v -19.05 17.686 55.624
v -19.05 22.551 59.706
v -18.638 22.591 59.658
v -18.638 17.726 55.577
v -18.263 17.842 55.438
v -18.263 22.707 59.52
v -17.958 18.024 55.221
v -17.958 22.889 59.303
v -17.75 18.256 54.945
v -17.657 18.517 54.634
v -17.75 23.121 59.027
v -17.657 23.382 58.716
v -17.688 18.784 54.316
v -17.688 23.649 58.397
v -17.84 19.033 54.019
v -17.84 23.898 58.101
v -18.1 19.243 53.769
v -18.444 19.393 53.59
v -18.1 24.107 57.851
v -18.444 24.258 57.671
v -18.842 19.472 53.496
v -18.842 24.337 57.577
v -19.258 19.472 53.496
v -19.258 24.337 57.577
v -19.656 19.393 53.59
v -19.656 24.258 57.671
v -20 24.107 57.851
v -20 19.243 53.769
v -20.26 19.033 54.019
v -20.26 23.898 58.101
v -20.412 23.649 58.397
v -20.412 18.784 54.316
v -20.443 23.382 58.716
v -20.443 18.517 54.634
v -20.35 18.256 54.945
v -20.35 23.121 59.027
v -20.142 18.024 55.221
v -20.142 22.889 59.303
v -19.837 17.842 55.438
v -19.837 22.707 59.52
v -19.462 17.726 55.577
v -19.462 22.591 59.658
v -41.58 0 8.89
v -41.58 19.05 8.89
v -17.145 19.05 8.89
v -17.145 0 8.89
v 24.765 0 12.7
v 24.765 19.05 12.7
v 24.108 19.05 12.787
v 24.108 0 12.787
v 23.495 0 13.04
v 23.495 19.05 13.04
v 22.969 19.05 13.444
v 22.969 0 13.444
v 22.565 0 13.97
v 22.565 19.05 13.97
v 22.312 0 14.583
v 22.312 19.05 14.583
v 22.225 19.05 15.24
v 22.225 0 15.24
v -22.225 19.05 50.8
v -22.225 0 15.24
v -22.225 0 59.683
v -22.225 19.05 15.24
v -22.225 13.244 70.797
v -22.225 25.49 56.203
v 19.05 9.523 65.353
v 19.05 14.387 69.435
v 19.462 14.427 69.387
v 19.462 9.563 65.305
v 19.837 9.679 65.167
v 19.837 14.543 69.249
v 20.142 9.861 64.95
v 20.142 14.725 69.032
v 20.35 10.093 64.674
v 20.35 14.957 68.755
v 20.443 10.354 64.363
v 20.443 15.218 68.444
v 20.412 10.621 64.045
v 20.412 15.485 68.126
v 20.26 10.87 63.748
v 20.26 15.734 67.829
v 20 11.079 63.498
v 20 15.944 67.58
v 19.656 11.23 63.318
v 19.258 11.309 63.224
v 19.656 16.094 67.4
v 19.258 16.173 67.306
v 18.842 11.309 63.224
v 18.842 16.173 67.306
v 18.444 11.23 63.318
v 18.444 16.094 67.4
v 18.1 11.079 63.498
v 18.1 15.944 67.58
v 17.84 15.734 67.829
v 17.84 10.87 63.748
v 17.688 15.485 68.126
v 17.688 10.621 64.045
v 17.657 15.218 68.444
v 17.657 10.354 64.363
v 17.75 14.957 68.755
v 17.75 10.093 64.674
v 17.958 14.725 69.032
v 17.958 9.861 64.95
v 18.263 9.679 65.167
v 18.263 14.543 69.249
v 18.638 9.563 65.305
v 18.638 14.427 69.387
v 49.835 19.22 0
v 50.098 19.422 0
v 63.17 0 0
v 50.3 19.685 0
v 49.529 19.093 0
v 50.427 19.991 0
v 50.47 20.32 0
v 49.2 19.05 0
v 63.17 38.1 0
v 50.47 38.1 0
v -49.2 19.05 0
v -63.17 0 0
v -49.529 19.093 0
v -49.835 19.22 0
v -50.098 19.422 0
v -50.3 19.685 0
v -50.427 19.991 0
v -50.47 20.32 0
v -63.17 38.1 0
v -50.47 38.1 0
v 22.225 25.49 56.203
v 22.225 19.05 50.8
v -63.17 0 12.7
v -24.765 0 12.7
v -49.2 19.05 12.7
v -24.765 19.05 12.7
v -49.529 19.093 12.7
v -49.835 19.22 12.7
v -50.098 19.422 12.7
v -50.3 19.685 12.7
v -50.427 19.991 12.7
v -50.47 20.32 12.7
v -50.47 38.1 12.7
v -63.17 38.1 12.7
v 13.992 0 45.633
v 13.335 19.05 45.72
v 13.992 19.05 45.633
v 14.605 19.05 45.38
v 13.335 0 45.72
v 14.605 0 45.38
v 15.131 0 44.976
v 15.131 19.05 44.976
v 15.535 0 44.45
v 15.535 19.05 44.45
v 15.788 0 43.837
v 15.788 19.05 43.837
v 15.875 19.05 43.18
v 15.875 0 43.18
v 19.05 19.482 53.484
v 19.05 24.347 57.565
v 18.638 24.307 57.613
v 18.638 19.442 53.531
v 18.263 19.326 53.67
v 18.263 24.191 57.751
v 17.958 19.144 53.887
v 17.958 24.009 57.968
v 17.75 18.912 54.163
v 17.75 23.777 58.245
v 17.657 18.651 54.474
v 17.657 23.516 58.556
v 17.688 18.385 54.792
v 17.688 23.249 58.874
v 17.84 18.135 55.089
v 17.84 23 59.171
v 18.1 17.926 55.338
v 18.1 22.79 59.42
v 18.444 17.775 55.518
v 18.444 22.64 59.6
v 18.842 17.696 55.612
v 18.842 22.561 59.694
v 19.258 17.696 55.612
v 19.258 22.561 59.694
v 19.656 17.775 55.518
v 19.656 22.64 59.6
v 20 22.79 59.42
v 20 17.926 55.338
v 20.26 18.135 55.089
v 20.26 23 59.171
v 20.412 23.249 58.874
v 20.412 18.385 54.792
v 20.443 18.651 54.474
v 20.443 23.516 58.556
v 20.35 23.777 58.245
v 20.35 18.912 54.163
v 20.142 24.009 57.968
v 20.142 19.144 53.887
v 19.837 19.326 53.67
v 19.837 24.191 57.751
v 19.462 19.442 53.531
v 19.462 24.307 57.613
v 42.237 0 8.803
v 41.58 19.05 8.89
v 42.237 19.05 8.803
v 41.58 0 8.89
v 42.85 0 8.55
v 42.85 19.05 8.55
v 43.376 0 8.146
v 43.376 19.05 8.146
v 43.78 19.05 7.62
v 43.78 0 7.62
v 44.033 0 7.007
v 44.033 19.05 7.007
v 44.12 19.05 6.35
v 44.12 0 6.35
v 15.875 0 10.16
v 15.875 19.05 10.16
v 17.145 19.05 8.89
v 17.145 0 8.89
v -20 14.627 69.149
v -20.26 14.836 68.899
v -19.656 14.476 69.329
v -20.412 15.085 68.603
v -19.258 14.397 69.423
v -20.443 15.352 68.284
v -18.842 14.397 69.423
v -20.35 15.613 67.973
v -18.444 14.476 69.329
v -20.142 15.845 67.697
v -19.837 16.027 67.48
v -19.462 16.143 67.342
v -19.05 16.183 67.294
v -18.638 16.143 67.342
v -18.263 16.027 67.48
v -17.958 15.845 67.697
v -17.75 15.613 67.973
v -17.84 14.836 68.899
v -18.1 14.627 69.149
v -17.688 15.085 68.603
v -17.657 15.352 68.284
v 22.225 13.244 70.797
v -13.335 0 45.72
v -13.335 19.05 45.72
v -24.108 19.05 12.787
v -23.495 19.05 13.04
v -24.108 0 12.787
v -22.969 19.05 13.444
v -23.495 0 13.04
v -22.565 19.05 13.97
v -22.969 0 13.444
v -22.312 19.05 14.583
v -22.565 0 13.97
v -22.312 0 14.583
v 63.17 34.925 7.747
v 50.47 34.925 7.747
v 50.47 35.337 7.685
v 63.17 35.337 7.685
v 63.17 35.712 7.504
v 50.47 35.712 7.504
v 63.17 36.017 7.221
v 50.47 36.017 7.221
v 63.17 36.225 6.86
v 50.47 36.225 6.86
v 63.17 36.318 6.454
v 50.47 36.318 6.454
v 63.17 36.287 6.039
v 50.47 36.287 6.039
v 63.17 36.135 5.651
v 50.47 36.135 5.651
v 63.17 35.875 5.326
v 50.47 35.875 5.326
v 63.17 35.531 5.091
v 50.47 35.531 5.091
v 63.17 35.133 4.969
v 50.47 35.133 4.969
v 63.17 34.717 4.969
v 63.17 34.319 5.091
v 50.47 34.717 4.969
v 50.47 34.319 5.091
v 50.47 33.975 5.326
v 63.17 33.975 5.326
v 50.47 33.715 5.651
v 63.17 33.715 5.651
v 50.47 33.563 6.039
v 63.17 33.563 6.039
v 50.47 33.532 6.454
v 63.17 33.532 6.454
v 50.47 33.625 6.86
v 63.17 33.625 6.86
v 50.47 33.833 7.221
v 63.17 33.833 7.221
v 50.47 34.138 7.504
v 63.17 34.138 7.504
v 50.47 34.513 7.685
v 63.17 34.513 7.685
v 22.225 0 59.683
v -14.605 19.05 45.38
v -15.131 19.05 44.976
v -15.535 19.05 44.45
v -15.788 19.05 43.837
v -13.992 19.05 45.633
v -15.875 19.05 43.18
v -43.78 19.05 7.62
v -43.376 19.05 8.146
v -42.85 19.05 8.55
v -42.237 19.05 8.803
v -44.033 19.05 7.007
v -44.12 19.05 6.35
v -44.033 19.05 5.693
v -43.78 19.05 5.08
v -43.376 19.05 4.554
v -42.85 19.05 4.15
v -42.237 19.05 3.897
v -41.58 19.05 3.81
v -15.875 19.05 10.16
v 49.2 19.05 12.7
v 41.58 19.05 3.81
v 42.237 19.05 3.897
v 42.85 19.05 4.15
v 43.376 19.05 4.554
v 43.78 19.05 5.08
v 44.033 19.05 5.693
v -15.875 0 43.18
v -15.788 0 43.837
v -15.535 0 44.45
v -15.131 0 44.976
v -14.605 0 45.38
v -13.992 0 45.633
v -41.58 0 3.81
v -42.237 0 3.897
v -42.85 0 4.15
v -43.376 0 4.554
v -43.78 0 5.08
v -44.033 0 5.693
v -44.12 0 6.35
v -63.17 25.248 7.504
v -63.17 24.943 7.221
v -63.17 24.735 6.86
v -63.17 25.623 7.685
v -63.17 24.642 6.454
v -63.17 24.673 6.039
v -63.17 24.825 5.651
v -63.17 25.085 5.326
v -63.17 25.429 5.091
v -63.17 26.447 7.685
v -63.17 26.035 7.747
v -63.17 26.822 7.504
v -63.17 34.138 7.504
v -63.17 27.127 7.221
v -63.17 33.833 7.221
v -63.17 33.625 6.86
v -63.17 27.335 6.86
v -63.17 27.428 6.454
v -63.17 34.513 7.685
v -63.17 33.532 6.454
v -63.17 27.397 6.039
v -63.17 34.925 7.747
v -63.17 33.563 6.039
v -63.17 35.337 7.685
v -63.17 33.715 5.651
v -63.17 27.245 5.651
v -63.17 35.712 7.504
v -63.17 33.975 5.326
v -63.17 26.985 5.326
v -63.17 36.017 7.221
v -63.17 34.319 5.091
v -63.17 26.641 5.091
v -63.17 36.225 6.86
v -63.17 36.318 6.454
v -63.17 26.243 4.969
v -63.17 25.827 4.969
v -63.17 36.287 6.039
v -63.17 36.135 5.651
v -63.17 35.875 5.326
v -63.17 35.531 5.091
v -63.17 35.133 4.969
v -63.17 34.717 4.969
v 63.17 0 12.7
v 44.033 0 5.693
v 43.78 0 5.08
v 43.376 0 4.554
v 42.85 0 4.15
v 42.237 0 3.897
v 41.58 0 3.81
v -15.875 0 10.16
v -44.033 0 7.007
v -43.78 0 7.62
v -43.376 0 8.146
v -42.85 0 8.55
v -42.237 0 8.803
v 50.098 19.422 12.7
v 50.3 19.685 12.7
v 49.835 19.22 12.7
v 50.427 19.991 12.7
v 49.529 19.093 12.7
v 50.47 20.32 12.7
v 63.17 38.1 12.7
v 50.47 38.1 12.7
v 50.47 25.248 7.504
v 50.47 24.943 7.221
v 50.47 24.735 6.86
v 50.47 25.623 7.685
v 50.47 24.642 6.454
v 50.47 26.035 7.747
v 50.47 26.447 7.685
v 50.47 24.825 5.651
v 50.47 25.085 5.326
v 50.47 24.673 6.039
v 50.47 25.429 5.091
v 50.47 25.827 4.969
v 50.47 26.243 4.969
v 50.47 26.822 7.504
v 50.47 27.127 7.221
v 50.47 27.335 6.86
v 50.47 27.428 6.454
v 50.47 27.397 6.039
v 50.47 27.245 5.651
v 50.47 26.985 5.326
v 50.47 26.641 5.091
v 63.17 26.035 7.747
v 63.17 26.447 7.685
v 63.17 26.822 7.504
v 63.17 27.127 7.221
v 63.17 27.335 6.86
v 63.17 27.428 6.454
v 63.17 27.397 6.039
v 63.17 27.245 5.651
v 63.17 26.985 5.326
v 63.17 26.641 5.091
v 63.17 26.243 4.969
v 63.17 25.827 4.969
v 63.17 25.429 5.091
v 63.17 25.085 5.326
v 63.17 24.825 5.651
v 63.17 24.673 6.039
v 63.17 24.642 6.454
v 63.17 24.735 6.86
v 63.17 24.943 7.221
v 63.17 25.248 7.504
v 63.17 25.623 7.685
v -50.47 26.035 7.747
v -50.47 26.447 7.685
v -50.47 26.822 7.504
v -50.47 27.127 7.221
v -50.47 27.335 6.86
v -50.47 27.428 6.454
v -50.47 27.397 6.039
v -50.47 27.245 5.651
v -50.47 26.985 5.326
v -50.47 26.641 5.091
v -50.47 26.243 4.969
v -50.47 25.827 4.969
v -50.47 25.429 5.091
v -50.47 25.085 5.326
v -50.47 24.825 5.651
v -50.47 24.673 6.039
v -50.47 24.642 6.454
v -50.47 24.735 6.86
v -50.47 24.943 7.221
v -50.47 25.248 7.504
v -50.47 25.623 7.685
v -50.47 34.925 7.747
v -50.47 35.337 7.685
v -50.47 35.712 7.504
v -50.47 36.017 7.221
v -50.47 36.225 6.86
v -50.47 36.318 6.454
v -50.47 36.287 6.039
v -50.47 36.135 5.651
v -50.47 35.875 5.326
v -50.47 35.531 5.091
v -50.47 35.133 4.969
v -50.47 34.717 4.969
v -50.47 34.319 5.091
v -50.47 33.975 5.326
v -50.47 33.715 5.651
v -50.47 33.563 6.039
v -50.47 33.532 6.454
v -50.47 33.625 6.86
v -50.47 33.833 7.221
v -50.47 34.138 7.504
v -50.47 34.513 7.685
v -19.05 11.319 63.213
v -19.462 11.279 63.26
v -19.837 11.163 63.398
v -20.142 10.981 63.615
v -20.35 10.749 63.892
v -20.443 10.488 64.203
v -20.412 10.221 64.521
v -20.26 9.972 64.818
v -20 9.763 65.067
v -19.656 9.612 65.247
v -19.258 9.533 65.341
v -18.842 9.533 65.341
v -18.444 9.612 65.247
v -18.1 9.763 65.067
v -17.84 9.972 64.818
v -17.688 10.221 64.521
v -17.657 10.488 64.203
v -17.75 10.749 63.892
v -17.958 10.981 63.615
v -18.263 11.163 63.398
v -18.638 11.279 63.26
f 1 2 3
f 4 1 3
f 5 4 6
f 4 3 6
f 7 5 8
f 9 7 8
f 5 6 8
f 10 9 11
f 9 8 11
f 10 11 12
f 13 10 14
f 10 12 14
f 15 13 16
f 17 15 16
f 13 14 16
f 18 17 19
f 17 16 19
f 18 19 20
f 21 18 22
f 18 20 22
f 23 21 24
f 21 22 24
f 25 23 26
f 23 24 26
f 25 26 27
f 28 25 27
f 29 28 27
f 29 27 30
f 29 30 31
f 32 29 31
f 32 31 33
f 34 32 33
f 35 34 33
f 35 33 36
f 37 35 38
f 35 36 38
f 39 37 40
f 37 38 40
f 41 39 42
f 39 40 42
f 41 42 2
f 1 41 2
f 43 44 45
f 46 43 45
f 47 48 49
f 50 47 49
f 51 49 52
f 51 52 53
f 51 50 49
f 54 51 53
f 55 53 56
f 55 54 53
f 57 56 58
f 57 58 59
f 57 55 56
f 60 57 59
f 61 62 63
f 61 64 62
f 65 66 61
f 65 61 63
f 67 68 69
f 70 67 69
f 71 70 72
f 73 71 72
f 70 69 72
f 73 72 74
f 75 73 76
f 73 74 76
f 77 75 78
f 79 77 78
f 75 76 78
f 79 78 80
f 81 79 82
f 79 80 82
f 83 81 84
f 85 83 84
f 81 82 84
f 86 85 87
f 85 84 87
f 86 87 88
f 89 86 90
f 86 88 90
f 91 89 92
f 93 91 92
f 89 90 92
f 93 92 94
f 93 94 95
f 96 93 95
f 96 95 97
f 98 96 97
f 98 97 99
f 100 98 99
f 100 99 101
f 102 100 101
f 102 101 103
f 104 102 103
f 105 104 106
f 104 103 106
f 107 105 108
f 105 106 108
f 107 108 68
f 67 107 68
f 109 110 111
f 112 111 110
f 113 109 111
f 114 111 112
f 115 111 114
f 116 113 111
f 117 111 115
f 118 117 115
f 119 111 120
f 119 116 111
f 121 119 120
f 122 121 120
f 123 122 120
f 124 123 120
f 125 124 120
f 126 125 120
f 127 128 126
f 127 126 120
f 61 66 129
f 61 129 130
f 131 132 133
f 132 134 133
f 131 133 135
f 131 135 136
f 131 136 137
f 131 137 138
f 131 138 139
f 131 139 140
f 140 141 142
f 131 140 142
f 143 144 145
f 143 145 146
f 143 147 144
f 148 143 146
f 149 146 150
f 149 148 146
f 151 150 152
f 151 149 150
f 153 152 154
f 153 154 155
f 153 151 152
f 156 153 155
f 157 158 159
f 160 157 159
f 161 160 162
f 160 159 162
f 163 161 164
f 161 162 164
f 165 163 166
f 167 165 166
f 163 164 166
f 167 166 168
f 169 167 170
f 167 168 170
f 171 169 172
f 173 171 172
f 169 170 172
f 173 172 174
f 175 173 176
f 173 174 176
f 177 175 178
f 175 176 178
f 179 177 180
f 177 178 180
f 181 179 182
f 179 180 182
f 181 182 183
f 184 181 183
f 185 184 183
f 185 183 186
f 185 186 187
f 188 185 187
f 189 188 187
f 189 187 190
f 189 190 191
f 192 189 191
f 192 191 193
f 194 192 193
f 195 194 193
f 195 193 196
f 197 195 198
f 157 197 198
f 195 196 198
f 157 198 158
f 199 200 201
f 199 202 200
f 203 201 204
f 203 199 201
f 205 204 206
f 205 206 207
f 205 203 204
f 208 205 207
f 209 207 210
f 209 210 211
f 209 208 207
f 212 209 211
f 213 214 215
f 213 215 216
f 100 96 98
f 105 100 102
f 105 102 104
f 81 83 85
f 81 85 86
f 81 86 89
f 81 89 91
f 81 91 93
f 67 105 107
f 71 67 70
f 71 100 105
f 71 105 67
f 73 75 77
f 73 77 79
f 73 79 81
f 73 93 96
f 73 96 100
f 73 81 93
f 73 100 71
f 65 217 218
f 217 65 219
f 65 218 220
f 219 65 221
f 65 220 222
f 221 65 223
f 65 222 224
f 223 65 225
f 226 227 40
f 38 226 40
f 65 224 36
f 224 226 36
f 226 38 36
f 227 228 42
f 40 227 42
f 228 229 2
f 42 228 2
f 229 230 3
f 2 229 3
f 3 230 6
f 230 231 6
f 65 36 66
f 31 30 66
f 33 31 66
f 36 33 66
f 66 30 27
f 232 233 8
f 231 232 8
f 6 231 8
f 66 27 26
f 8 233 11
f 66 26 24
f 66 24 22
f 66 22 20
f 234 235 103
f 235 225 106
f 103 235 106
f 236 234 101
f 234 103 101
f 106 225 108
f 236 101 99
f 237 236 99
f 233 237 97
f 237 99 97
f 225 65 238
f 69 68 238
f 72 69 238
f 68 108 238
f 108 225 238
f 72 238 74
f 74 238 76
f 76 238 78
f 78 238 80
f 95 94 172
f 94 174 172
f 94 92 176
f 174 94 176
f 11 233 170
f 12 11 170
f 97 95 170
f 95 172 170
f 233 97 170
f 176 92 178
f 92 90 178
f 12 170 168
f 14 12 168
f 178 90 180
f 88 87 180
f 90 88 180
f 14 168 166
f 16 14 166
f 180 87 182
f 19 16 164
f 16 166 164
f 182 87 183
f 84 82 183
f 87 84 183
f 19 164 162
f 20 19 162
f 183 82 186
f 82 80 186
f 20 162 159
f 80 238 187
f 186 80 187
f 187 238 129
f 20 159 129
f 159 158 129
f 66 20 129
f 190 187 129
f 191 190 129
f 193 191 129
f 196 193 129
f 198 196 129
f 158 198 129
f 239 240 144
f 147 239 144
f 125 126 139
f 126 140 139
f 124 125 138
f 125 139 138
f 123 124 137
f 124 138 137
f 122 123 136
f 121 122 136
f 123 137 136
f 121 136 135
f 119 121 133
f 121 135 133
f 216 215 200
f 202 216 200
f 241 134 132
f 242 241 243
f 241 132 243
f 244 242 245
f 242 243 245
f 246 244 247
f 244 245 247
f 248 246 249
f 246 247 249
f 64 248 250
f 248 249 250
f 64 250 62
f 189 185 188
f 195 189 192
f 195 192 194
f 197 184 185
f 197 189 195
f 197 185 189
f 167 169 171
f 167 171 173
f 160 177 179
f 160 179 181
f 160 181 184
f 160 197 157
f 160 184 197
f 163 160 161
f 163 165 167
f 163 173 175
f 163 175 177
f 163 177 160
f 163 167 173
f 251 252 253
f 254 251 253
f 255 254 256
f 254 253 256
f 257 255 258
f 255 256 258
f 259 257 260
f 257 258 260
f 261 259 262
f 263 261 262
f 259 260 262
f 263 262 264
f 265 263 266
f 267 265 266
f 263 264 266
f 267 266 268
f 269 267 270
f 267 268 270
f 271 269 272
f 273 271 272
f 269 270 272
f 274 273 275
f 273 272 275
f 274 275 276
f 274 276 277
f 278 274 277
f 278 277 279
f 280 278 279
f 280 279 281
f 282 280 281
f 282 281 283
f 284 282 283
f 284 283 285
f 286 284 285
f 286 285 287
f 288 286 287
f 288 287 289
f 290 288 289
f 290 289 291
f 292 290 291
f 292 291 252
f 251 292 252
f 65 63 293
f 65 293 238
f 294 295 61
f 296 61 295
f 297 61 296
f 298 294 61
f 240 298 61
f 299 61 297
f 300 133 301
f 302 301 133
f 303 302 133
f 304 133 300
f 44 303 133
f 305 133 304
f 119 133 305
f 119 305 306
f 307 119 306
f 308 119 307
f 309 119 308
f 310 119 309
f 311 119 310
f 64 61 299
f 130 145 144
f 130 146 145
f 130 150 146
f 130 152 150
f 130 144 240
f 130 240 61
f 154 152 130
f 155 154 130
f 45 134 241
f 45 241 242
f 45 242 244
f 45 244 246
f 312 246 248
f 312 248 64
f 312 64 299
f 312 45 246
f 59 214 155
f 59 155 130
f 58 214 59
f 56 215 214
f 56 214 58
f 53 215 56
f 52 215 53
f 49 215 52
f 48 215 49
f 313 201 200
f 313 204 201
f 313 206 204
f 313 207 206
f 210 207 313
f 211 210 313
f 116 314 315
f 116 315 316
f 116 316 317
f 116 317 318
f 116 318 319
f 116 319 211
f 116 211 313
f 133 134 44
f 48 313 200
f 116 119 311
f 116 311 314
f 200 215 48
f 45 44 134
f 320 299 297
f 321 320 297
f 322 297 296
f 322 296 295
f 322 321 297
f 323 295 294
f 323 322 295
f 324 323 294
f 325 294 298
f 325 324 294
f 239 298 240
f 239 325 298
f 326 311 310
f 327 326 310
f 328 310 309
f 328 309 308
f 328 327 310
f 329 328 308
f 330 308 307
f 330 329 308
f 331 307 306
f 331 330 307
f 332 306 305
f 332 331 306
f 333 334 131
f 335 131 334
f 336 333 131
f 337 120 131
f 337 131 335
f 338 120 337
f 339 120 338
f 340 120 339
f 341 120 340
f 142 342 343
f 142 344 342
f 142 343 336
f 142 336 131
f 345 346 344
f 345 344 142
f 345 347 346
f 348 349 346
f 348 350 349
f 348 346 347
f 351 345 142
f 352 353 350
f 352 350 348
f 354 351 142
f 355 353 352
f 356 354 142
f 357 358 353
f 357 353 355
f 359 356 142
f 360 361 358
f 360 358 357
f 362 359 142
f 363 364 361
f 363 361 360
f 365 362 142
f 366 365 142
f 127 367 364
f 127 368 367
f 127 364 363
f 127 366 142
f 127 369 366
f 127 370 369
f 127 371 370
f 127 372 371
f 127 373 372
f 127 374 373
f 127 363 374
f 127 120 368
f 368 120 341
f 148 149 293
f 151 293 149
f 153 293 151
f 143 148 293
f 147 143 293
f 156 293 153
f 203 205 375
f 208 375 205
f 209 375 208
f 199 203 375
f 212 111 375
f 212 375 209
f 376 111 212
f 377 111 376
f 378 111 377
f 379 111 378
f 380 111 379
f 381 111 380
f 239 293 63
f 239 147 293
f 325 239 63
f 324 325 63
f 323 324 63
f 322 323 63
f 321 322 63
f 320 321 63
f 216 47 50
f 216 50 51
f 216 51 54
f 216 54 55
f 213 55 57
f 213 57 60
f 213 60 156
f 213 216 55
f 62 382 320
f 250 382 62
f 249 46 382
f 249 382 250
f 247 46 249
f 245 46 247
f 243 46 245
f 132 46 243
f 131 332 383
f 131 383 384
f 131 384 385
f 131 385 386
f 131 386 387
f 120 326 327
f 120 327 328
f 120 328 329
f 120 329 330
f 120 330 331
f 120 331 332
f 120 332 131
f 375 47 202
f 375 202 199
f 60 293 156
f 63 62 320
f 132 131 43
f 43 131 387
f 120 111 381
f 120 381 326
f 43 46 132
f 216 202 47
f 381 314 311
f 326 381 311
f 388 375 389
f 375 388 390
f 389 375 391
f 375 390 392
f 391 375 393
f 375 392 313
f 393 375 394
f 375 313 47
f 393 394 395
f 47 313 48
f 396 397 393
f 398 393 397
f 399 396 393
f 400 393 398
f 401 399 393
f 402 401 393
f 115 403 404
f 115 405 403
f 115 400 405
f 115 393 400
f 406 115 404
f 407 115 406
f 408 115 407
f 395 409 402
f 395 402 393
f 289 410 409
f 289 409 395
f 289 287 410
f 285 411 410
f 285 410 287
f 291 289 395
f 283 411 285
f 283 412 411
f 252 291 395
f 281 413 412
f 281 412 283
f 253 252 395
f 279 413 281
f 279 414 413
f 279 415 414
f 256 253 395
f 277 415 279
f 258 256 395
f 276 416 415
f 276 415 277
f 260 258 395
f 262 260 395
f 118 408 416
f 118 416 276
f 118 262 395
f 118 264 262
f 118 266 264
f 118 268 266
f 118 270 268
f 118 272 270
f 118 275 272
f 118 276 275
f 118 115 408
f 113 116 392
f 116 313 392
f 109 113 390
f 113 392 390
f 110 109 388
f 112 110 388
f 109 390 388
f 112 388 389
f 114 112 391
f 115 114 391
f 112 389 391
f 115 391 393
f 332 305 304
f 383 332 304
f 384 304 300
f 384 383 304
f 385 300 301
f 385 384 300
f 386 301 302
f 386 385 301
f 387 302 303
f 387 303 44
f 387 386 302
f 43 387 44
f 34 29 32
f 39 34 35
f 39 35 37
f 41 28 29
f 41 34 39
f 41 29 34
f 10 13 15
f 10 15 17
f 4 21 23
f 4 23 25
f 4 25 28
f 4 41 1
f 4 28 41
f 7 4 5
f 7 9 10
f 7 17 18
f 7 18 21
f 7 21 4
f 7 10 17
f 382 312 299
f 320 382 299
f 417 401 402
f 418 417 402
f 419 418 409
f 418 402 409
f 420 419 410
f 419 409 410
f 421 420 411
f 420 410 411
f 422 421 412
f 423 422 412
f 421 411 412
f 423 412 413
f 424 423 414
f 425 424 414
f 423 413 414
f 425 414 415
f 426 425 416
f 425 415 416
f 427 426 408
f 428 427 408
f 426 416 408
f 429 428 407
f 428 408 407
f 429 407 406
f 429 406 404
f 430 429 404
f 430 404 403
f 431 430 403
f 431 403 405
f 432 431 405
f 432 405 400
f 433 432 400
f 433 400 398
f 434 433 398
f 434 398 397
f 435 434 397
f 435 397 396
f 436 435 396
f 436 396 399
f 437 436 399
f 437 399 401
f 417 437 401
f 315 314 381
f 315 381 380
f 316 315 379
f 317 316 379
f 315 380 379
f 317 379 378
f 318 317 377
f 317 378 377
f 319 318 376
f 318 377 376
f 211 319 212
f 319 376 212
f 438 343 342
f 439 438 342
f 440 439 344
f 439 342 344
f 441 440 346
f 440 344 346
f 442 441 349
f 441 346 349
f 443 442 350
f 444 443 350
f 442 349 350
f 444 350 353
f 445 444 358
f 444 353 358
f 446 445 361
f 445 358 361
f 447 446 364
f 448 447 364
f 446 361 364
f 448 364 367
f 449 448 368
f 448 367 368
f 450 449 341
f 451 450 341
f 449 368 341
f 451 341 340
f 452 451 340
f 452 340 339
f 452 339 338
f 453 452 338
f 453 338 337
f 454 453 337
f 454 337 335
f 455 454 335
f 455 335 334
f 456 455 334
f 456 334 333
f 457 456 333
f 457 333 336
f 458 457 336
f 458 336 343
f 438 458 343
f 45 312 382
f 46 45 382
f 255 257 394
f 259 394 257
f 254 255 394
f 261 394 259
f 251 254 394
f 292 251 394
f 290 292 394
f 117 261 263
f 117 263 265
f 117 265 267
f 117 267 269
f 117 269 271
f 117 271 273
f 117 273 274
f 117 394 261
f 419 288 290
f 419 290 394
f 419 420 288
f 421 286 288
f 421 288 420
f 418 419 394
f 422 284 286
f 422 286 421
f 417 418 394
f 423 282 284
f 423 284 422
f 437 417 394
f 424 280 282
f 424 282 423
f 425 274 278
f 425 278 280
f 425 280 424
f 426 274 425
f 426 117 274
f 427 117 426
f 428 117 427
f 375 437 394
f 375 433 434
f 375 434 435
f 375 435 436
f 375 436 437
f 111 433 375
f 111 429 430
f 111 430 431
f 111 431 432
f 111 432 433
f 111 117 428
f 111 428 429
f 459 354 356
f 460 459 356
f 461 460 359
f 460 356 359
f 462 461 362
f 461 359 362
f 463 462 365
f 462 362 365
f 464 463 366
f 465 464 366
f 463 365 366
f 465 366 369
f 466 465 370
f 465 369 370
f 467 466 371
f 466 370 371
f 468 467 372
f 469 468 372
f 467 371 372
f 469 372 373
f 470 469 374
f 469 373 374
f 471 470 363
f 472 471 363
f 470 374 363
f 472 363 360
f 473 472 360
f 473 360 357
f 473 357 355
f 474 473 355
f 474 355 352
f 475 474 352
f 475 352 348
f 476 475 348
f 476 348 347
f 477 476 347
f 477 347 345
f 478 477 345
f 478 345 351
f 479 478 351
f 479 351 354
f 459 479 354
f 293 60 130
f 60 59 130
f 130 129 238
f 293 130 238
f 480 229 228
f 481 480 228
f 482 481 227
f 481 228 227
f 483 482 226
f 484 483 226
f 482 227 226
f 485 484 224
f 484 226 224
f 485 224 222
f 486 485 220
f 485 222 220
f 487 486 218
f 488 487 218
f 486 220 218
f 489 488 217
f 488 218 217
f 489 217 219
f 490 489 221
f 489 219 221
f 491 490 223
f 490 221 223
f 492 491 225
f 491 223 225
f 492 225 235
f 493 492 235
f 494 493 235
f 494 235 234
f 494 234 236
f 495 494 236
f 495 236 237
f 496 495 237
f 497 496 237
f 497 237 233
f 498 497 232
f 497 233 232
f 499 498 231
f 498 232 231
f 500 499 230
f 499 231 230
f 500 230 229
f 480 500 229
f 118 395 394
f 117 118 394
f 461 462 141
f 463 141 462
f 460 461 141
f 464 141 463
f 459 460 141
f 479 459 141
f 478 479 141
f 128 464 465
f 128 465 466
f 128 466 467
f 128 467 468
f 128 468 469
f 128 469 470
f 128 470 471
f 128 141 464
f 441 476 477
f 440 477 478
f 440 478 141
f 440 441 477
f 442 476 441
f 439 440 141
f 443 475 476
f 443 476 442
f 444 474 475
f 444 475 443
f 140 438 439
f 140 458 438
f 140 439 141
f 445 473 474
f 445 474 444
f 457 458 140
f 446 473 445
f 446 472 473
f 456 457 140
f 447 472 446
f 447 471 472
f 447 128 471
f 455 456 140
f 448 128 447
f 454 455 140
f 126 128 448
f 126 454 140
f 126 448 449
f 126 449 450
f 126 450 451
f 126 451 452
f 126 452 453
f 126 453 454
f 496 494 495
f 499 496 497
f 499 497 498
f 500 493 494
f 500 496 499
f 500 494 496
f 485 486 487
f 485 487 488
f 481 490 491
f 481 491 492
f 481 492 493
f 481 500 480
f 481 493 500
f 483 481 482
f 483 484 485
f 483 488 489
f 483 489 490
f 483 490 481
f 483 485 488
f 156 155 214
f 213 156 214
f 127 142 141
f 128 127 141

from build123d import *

# Parameters (mm, degrees)
BOSS_EXTRUDE1_DEPTH = 12.7
SKETCH2_R           = 1.397
CUT_EXTRUDE1_DEPTH  = 133.569206561
FILLET1_R           = 1.27
BOSS_EXTRUDE2_DEPTH = 22.225
CUT_EXTRUDE3_DEPTH  = 97.775414884
FILLET3_R           = 2.54
CHAMFER1_SIZE       = 1.27
SKETCH7_R           = 1.397
CUT_EXTRUDE4_DEPTH  = 6.35


with BuildPart() as part:
    # Sketch1 → Boss-Extrude1 (new body)
    with BuildSketch(Plane.XY):
        Polygon((63.1698, 0), (-63.1698, 0), (-63.1698, 38.1), (-50.4698, 38.1), (-50.4698, 19.05), (50.4698, 19.05), (50.4698, 38.1), (63.1698, 38.1), align=None)
    extrude(amount=BOSS_EXTRUDE1_DEPTH)

    # Sketch2 → Cut-Extrude1 (cut, through all)
    with BuildSketch(Plane.ZY.offset(63.1698)):
        with Locations((6.35, 34.925)):
            Circle(SKETCH2_R)
        with Locations((6.35, 26.035)):
            Circle(SKETCH2_R)
    extrude(amount=-CUT_EXTRUDE1_DEPTH, mode=Mode.SUBTRACT)

    # Fillet1
    fillet1_edges = [part.edges().sort_by_distance(p)[0] for p in [
        (-50.4698, 19.05, 6.35),
        (50.4698, 19.05, 6.35),
    ]]
    fillet(fillet1_edges, radius=FILLET1_R)

    # Sketch3 → Boss-Extrude2 (add, symmetric)
    with BuildSketch(Plane(origin=(0, 0, 0), x_dir=(0, 0, -1), z_dir=(1, 0, 0))):
        Polygon((-12.7, 19.05), (-12.7, 0), (-59.683160888, 0), (-70.796573321, 13.244449193), (-56.203426679, 25.489553157), (-50.8, 19.05), align=None)
    extrude(amount=BOSS_EXTRUDE2_DEPTH, both=True)

    # Sketch6 → Cut-Extrude3 (cut, through all)
    with BuildSketch(Plane(origin=(0, 19.05, 0), x_dir=(1, 0, 0), z_dir=(0, 1, 0))):
        Polygon((44.1198, -3.81), (-44.1198, -3.81), (-44.1198, -8.89), (-15.875, -8.89), (-15.875, -45.72), (15.875, -45.72), (15.875, -8.89), (44.1198, -8.89), align=None)
    extrude(amount=-CUT_EXTRUDE3_DEPTH, mode=Mode.SUBTRACT)

    # Fillet3
    fillet3_edges = [part.edges().sort_by_distance(p)[0] for p in [
        (44.1198, 9.525, 8.89),
        (44.1198, 9.525, 3.81),
        (15.875, 9.525, 45.72),
        (-15.875, 9.525, 45.72),
        (-44.1198, 9.525, 8.89),
        (-44.1198, 9.525, 3.81),
        (22.225, 9.525, 12.7),
        (-22.225, 9.525, 12.7),
    ]]
    fillet(fillet3_edges, radius=FILLET3_R - 0.0001)  # a hair under: the kernel refuses the full size

    # Chamfer1
    chamfer1_edges = [part.edges().sort_by_distance(p)[0] for p in [
        (15.875, 9.525, 8.89),
        (-15.875, 9.525, 8.89),
    ]]
    chamfer(chamfer1_edges, length=CHAMFER1_SIZE)

    # Sketch7 → Cut-Extrude4 (cut, symmetric)
    with BuildSketch(Plane(origin=(0, 42.632668976, 35.773056814), x_dir=(1, 0, 0), z_dir=(0, 0.7660444431189747, 0.6427876096865435))):
        with Locations(Location((-19.05, -29.844953746, 0), (0, 0, 270))):
            Circle(SKETCH7_R)
        with Locations(Location((-19.05, -42.544953746, 0), (0, 0, 90))):
            Circle(SKETCH7_R)
        with Locations(Location((19.05, -42.544953746, 0), (0, 0, 270))):
            Circle(SKETCH7_R)
        with Locations(Location((19.05, -29.844953746, 0), (0, 0, 90))):
            Circle(SKETCH7_R)
    extrude(amount=CUT_EXTRUDE4_DEPTH, both=True, mode=Mode.SUBTRACT)


solid = part.part
